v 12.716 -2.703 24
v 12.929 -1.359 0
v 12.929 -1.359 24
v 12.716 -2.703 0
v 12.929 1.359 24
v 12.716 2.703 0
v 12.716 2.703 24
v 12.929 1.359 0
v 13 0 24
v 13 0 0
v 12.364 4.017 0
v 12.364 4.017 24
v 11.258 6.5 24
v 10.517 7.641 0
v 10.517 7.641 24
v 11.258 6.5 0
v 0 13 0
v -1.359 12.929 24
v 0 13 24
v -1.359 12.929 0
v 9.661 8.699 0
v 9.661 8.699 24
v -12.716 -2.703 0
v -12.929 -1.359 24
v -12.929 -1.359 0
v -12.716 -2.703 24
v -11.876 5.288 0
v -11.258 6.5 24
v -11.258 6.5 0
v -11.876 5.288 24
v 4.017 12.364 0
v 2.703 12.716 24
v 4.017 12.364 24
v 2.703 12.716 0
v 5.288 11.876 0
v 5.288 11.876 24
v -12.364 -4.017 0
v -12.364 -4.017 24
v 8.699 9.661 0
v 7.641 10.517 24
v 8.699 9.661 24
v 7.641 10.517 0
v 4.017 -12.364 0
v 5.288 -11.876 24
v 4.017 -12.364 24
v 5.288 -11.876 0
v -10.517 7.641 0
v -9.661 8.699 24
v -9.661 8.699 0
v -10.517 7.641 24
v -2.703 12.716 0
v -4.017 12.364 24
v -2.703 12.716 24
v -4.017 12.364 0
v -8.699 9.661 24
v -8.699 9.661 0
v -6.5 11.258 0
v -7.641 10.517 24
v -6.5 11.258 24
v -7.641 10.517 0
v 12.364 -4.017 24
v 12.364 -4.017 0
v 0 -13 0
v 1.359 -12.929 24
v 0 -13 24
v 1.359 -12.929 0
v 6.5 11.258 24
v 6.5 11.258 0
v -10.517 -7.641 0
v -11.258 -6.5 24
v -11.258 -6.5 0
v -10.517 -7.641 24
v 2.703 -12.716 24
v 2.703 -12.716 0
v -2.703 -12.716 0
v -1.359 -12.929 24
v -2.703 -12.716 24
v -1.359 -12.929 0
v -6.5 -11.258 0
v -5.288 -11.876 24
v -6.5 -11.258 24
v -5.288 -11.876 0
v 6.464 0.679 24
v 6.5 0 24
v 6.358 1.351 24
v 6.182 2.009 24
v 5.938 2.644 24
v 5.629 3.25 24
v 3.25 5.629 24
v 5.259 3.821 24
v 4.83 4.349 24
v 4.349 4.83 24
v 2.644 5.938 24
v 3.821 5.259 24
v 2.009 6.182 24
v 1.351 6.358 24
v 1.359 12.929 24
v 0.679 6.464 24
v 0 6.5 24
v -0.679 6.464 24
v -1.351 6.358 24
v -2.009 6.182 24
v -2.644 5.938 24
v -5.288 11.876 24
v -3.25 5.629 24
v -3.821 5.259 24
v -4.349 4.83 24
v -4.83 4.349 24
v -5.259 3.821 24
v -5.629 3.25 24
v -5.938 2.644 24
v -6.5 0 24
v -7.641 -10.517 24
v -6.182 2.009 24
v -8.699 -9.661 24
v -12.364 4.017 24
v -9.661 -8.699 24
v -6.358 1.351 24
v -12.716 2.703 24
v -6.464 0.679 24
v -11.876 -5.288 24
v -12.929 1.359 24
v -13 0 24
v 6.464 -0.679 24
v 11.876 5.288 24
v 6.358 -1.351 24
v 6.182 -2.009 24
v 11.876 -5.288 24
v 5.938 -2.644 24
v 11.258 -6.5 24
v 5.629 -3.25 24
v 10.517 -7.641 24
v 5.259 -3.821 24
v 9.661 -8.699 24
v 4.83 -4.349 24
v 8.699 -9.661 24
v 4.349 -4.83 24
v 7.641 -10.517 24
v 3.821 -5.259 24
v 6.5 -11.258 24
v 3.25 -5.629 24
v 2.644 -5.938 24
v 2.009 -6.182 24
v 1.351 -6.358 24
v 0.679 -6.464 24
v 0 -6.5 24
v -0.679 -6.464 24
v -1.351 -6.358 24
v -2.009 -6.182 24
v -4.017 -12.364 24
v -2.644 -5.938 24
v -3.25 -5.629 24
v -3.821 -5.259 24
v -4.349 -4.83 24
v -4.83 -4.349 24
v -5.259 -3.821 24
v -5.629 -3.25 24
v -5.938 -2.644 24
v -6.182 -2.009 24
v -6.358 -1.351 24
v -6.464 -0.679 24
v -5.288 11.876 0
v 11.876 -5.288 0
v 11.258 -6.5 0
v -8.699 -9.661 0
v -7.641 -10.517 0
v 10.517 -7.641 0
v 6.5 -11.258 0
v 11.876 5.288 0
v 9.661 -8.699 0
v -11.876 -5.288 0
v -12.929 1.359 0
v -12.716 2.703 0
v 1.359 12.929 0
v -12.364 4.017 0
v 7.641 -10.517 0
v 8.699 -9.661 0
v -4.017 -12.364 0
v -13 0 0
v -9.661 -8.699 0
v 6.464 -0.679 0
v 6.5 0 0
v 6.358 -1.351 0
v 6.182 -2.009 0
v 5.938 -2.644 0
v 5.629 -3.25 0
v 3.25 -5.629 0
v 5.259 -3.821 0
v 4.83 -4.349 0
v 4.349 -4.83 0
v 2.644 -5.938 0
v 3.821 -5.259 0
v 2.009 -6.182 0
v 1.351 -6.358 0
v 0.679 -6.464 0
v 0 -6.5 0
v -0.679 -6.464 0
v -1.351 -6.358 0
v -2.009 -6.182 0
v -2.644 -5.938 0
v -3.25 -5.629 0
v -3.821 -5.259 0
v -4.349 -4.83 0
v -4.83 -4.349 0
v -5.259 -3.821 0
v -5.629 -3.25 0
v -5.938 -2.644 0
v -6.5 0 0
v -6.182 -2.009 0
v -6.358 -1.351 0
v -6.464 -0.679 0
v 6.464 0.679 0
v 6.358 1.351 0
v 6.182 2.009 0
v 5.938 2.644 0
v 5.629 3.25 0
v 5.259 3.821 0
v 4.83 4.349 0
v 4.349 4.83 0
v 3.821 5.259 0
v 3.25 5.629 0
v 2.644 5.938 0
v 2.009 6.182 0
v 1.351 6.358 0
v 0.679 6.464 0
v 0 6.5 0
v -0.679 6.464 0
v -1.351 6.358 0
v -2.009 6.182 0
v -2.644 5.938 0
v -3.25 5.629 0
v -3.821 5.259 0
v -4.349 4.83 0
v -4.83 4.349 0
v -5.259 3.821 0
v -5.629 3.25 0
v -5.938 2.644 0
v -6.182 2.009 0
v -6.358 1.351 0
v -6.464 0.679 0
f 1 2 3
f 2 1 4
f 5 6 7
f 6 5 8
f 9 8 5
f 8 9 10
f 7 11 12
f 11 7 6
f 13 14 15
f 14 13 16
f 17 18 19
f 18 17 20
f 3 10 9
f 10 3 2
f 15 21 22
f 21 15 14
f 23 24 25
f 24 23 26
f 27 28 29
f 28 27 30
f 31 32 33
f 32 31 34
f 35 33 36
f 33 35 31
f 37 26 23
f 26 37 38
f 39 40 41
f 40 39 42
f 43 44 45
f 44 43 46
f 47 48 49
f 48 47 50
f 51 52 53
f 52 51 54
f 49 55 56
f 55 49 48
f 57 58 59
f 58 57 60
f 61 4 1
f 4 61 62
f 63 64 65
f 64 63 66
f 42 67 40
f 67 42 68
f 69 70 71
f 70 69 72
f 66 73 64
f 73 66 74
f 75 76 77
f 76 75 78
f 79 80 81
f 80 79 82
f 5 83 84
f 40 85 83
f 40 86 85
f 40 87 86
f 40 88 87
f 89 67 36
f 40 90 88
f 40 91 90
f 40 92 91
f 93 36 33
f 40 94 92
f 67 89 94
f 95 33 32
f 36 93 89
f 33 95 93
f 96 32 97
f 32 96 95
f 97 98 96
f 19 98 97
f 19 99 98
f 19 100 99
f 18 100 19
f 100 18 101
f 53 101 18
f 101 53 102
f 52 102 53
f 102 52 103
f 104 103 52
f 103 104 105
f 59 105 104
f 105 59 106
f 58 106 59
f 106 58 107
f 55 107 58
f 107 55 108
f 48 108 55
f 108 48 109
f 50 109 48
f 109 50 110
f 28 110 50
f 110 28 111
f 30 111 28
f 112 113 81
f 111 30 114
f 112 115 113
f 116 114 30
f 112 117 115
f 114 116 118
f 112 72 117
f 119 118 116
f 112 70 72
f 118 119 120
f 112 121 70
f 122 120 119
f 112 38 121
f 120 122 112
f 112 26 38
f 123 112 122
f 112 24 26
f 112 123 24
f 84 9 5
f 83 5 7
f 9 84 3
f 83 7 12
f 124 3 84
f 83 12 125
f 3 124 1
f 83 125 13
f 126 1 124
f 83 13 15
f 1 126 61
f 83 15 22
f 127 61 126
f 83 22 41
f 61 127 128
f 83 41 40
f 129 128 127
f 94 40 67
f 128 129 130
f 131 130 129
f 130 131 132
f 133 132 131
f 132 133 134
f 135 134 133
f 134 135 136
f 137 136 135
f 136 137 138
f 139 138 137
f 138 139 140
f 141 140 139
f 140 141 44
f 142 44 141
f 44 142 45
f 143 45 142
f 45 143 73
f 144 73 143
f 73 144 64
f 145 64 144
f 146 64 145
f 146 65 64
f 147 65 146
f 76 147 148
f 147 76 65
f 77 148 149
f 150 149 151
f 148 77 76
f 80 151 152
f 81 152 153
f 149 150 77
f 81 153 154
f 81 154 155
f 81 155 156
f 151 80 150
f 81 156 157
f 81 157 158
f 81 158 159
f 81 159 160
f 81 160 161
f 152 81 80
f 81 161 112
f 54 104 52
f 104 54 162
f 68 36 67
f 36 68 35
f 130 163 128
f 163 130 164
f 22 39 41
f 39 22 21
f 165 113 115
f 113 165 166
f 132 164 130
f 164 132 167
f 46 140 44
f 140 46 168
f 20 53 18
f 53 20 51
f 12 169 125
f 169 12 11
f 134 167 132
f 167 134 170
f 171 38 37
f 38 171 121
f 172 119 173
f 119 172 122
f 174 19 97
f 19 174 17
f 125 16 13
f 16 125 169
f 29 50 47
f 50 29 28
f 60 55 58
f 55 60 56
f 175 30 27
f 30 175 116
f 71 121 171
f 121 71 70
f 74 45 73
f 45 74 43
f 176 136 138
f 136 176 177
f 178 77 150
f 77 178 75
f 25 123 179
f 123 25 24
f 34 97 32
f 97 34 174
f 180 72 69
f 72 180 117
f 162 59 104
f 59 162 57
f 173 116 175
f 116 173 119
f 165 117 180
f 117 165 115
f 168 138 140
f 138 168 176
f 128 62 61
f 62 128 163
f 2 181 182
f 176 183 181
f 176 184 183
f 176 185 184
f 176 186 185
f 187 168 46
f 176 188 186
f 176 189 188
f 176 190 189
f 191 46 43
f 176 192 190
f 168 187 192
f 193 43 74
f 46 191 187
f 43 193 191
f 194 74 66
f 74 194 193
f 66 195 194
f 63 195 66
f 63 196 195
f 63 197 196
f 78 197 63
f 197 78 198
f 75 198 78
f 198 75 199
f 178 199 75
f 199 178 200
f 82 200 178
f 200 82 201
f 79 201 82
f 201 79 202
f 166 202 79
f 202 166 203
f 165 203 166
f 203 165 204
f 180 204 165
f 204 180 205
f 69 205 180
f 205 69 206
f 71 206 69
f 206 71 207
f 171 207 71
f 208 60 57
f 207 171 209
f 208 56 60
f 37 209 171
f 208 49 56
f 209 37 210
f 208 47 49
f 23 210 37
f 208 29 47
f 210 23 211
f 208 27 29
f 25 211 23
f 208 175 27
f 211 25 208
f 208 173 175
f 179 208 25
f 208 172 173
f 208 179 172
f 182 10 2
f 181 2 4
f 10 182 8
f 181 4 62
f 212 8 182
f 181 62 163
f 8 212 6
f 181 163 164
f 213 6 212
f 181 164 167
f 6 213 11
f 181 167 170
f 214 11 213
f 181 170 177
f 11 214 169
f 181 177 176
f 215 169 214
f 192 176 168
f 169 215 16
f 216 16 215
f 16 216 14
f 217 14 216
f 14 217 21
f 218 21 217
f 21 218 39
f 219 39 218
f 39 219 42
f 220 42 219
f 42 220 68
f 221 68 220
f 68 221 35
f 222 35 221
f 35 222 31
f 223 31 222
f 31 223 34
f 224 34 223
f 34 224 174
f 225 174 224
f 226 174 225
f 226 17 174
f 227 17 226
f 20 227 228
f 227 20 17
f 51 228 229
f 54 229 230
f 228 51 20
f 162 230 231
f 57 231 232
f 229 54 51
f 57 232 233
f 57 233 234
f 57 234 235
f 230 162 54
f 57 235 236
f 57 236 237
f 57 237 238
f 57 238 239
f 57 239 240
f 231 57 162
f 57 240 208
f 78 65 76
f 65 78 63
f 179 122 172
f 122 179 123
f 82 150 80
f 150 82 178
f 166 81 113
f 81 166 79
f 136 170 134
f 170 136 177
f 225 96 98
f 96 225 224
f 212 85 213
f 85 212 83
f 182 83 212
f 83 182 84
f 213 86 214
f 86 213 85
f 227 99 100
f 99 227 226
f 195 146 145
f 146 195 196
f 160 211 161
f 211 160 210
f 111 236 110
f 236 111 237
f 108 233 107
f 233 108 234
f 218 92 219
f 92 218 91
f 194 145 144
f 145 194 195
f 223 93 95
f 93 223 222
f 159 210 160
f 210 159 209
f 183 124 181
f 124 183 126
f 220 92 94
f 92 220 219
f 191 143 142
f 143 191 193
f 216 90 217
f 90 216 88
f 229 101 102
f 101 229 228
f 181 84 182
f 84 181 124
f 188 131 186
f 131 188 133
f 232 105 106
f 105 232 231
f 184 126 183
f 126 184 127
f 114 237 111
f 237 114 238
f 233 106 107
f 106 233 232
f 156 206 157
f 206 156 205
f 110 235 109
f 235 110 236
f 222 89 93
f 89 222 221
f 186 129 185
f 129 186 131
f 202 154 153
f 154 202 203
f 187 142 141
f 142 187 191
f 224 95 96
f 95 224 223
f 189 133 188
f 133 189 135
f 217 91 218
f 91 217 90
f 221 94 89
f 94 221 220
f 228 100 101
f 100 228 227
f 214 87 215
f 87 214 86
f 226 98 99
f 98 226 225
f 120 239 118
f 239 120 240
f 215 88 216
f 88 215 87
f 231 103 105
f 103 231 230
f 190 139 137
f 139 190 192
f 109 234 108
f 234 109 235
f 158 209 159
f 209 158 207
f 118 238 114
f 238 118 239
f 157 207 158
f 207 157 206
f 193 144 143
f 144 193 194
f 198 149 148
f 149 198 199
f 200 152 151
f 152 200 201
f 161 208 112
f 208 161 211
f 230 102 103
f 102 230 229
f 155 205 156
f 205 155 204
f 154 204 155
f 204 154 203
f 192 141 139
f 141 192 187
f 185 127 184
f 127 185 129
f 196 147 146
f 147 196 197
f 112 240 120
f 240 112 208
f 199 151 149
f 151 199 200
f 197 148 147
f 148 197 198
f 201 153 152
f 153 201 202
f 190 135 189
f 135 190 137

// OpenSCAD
// Round spacer.
$fn = 60;
eps = 0.02;
inner_d = 13;
outer_d = 26;
length = 24;
difference() { cylinder(d=outer_d,h=length); translate([0,0,-eps]) cylinder(d=inner_d,h=length+2*eps); }
